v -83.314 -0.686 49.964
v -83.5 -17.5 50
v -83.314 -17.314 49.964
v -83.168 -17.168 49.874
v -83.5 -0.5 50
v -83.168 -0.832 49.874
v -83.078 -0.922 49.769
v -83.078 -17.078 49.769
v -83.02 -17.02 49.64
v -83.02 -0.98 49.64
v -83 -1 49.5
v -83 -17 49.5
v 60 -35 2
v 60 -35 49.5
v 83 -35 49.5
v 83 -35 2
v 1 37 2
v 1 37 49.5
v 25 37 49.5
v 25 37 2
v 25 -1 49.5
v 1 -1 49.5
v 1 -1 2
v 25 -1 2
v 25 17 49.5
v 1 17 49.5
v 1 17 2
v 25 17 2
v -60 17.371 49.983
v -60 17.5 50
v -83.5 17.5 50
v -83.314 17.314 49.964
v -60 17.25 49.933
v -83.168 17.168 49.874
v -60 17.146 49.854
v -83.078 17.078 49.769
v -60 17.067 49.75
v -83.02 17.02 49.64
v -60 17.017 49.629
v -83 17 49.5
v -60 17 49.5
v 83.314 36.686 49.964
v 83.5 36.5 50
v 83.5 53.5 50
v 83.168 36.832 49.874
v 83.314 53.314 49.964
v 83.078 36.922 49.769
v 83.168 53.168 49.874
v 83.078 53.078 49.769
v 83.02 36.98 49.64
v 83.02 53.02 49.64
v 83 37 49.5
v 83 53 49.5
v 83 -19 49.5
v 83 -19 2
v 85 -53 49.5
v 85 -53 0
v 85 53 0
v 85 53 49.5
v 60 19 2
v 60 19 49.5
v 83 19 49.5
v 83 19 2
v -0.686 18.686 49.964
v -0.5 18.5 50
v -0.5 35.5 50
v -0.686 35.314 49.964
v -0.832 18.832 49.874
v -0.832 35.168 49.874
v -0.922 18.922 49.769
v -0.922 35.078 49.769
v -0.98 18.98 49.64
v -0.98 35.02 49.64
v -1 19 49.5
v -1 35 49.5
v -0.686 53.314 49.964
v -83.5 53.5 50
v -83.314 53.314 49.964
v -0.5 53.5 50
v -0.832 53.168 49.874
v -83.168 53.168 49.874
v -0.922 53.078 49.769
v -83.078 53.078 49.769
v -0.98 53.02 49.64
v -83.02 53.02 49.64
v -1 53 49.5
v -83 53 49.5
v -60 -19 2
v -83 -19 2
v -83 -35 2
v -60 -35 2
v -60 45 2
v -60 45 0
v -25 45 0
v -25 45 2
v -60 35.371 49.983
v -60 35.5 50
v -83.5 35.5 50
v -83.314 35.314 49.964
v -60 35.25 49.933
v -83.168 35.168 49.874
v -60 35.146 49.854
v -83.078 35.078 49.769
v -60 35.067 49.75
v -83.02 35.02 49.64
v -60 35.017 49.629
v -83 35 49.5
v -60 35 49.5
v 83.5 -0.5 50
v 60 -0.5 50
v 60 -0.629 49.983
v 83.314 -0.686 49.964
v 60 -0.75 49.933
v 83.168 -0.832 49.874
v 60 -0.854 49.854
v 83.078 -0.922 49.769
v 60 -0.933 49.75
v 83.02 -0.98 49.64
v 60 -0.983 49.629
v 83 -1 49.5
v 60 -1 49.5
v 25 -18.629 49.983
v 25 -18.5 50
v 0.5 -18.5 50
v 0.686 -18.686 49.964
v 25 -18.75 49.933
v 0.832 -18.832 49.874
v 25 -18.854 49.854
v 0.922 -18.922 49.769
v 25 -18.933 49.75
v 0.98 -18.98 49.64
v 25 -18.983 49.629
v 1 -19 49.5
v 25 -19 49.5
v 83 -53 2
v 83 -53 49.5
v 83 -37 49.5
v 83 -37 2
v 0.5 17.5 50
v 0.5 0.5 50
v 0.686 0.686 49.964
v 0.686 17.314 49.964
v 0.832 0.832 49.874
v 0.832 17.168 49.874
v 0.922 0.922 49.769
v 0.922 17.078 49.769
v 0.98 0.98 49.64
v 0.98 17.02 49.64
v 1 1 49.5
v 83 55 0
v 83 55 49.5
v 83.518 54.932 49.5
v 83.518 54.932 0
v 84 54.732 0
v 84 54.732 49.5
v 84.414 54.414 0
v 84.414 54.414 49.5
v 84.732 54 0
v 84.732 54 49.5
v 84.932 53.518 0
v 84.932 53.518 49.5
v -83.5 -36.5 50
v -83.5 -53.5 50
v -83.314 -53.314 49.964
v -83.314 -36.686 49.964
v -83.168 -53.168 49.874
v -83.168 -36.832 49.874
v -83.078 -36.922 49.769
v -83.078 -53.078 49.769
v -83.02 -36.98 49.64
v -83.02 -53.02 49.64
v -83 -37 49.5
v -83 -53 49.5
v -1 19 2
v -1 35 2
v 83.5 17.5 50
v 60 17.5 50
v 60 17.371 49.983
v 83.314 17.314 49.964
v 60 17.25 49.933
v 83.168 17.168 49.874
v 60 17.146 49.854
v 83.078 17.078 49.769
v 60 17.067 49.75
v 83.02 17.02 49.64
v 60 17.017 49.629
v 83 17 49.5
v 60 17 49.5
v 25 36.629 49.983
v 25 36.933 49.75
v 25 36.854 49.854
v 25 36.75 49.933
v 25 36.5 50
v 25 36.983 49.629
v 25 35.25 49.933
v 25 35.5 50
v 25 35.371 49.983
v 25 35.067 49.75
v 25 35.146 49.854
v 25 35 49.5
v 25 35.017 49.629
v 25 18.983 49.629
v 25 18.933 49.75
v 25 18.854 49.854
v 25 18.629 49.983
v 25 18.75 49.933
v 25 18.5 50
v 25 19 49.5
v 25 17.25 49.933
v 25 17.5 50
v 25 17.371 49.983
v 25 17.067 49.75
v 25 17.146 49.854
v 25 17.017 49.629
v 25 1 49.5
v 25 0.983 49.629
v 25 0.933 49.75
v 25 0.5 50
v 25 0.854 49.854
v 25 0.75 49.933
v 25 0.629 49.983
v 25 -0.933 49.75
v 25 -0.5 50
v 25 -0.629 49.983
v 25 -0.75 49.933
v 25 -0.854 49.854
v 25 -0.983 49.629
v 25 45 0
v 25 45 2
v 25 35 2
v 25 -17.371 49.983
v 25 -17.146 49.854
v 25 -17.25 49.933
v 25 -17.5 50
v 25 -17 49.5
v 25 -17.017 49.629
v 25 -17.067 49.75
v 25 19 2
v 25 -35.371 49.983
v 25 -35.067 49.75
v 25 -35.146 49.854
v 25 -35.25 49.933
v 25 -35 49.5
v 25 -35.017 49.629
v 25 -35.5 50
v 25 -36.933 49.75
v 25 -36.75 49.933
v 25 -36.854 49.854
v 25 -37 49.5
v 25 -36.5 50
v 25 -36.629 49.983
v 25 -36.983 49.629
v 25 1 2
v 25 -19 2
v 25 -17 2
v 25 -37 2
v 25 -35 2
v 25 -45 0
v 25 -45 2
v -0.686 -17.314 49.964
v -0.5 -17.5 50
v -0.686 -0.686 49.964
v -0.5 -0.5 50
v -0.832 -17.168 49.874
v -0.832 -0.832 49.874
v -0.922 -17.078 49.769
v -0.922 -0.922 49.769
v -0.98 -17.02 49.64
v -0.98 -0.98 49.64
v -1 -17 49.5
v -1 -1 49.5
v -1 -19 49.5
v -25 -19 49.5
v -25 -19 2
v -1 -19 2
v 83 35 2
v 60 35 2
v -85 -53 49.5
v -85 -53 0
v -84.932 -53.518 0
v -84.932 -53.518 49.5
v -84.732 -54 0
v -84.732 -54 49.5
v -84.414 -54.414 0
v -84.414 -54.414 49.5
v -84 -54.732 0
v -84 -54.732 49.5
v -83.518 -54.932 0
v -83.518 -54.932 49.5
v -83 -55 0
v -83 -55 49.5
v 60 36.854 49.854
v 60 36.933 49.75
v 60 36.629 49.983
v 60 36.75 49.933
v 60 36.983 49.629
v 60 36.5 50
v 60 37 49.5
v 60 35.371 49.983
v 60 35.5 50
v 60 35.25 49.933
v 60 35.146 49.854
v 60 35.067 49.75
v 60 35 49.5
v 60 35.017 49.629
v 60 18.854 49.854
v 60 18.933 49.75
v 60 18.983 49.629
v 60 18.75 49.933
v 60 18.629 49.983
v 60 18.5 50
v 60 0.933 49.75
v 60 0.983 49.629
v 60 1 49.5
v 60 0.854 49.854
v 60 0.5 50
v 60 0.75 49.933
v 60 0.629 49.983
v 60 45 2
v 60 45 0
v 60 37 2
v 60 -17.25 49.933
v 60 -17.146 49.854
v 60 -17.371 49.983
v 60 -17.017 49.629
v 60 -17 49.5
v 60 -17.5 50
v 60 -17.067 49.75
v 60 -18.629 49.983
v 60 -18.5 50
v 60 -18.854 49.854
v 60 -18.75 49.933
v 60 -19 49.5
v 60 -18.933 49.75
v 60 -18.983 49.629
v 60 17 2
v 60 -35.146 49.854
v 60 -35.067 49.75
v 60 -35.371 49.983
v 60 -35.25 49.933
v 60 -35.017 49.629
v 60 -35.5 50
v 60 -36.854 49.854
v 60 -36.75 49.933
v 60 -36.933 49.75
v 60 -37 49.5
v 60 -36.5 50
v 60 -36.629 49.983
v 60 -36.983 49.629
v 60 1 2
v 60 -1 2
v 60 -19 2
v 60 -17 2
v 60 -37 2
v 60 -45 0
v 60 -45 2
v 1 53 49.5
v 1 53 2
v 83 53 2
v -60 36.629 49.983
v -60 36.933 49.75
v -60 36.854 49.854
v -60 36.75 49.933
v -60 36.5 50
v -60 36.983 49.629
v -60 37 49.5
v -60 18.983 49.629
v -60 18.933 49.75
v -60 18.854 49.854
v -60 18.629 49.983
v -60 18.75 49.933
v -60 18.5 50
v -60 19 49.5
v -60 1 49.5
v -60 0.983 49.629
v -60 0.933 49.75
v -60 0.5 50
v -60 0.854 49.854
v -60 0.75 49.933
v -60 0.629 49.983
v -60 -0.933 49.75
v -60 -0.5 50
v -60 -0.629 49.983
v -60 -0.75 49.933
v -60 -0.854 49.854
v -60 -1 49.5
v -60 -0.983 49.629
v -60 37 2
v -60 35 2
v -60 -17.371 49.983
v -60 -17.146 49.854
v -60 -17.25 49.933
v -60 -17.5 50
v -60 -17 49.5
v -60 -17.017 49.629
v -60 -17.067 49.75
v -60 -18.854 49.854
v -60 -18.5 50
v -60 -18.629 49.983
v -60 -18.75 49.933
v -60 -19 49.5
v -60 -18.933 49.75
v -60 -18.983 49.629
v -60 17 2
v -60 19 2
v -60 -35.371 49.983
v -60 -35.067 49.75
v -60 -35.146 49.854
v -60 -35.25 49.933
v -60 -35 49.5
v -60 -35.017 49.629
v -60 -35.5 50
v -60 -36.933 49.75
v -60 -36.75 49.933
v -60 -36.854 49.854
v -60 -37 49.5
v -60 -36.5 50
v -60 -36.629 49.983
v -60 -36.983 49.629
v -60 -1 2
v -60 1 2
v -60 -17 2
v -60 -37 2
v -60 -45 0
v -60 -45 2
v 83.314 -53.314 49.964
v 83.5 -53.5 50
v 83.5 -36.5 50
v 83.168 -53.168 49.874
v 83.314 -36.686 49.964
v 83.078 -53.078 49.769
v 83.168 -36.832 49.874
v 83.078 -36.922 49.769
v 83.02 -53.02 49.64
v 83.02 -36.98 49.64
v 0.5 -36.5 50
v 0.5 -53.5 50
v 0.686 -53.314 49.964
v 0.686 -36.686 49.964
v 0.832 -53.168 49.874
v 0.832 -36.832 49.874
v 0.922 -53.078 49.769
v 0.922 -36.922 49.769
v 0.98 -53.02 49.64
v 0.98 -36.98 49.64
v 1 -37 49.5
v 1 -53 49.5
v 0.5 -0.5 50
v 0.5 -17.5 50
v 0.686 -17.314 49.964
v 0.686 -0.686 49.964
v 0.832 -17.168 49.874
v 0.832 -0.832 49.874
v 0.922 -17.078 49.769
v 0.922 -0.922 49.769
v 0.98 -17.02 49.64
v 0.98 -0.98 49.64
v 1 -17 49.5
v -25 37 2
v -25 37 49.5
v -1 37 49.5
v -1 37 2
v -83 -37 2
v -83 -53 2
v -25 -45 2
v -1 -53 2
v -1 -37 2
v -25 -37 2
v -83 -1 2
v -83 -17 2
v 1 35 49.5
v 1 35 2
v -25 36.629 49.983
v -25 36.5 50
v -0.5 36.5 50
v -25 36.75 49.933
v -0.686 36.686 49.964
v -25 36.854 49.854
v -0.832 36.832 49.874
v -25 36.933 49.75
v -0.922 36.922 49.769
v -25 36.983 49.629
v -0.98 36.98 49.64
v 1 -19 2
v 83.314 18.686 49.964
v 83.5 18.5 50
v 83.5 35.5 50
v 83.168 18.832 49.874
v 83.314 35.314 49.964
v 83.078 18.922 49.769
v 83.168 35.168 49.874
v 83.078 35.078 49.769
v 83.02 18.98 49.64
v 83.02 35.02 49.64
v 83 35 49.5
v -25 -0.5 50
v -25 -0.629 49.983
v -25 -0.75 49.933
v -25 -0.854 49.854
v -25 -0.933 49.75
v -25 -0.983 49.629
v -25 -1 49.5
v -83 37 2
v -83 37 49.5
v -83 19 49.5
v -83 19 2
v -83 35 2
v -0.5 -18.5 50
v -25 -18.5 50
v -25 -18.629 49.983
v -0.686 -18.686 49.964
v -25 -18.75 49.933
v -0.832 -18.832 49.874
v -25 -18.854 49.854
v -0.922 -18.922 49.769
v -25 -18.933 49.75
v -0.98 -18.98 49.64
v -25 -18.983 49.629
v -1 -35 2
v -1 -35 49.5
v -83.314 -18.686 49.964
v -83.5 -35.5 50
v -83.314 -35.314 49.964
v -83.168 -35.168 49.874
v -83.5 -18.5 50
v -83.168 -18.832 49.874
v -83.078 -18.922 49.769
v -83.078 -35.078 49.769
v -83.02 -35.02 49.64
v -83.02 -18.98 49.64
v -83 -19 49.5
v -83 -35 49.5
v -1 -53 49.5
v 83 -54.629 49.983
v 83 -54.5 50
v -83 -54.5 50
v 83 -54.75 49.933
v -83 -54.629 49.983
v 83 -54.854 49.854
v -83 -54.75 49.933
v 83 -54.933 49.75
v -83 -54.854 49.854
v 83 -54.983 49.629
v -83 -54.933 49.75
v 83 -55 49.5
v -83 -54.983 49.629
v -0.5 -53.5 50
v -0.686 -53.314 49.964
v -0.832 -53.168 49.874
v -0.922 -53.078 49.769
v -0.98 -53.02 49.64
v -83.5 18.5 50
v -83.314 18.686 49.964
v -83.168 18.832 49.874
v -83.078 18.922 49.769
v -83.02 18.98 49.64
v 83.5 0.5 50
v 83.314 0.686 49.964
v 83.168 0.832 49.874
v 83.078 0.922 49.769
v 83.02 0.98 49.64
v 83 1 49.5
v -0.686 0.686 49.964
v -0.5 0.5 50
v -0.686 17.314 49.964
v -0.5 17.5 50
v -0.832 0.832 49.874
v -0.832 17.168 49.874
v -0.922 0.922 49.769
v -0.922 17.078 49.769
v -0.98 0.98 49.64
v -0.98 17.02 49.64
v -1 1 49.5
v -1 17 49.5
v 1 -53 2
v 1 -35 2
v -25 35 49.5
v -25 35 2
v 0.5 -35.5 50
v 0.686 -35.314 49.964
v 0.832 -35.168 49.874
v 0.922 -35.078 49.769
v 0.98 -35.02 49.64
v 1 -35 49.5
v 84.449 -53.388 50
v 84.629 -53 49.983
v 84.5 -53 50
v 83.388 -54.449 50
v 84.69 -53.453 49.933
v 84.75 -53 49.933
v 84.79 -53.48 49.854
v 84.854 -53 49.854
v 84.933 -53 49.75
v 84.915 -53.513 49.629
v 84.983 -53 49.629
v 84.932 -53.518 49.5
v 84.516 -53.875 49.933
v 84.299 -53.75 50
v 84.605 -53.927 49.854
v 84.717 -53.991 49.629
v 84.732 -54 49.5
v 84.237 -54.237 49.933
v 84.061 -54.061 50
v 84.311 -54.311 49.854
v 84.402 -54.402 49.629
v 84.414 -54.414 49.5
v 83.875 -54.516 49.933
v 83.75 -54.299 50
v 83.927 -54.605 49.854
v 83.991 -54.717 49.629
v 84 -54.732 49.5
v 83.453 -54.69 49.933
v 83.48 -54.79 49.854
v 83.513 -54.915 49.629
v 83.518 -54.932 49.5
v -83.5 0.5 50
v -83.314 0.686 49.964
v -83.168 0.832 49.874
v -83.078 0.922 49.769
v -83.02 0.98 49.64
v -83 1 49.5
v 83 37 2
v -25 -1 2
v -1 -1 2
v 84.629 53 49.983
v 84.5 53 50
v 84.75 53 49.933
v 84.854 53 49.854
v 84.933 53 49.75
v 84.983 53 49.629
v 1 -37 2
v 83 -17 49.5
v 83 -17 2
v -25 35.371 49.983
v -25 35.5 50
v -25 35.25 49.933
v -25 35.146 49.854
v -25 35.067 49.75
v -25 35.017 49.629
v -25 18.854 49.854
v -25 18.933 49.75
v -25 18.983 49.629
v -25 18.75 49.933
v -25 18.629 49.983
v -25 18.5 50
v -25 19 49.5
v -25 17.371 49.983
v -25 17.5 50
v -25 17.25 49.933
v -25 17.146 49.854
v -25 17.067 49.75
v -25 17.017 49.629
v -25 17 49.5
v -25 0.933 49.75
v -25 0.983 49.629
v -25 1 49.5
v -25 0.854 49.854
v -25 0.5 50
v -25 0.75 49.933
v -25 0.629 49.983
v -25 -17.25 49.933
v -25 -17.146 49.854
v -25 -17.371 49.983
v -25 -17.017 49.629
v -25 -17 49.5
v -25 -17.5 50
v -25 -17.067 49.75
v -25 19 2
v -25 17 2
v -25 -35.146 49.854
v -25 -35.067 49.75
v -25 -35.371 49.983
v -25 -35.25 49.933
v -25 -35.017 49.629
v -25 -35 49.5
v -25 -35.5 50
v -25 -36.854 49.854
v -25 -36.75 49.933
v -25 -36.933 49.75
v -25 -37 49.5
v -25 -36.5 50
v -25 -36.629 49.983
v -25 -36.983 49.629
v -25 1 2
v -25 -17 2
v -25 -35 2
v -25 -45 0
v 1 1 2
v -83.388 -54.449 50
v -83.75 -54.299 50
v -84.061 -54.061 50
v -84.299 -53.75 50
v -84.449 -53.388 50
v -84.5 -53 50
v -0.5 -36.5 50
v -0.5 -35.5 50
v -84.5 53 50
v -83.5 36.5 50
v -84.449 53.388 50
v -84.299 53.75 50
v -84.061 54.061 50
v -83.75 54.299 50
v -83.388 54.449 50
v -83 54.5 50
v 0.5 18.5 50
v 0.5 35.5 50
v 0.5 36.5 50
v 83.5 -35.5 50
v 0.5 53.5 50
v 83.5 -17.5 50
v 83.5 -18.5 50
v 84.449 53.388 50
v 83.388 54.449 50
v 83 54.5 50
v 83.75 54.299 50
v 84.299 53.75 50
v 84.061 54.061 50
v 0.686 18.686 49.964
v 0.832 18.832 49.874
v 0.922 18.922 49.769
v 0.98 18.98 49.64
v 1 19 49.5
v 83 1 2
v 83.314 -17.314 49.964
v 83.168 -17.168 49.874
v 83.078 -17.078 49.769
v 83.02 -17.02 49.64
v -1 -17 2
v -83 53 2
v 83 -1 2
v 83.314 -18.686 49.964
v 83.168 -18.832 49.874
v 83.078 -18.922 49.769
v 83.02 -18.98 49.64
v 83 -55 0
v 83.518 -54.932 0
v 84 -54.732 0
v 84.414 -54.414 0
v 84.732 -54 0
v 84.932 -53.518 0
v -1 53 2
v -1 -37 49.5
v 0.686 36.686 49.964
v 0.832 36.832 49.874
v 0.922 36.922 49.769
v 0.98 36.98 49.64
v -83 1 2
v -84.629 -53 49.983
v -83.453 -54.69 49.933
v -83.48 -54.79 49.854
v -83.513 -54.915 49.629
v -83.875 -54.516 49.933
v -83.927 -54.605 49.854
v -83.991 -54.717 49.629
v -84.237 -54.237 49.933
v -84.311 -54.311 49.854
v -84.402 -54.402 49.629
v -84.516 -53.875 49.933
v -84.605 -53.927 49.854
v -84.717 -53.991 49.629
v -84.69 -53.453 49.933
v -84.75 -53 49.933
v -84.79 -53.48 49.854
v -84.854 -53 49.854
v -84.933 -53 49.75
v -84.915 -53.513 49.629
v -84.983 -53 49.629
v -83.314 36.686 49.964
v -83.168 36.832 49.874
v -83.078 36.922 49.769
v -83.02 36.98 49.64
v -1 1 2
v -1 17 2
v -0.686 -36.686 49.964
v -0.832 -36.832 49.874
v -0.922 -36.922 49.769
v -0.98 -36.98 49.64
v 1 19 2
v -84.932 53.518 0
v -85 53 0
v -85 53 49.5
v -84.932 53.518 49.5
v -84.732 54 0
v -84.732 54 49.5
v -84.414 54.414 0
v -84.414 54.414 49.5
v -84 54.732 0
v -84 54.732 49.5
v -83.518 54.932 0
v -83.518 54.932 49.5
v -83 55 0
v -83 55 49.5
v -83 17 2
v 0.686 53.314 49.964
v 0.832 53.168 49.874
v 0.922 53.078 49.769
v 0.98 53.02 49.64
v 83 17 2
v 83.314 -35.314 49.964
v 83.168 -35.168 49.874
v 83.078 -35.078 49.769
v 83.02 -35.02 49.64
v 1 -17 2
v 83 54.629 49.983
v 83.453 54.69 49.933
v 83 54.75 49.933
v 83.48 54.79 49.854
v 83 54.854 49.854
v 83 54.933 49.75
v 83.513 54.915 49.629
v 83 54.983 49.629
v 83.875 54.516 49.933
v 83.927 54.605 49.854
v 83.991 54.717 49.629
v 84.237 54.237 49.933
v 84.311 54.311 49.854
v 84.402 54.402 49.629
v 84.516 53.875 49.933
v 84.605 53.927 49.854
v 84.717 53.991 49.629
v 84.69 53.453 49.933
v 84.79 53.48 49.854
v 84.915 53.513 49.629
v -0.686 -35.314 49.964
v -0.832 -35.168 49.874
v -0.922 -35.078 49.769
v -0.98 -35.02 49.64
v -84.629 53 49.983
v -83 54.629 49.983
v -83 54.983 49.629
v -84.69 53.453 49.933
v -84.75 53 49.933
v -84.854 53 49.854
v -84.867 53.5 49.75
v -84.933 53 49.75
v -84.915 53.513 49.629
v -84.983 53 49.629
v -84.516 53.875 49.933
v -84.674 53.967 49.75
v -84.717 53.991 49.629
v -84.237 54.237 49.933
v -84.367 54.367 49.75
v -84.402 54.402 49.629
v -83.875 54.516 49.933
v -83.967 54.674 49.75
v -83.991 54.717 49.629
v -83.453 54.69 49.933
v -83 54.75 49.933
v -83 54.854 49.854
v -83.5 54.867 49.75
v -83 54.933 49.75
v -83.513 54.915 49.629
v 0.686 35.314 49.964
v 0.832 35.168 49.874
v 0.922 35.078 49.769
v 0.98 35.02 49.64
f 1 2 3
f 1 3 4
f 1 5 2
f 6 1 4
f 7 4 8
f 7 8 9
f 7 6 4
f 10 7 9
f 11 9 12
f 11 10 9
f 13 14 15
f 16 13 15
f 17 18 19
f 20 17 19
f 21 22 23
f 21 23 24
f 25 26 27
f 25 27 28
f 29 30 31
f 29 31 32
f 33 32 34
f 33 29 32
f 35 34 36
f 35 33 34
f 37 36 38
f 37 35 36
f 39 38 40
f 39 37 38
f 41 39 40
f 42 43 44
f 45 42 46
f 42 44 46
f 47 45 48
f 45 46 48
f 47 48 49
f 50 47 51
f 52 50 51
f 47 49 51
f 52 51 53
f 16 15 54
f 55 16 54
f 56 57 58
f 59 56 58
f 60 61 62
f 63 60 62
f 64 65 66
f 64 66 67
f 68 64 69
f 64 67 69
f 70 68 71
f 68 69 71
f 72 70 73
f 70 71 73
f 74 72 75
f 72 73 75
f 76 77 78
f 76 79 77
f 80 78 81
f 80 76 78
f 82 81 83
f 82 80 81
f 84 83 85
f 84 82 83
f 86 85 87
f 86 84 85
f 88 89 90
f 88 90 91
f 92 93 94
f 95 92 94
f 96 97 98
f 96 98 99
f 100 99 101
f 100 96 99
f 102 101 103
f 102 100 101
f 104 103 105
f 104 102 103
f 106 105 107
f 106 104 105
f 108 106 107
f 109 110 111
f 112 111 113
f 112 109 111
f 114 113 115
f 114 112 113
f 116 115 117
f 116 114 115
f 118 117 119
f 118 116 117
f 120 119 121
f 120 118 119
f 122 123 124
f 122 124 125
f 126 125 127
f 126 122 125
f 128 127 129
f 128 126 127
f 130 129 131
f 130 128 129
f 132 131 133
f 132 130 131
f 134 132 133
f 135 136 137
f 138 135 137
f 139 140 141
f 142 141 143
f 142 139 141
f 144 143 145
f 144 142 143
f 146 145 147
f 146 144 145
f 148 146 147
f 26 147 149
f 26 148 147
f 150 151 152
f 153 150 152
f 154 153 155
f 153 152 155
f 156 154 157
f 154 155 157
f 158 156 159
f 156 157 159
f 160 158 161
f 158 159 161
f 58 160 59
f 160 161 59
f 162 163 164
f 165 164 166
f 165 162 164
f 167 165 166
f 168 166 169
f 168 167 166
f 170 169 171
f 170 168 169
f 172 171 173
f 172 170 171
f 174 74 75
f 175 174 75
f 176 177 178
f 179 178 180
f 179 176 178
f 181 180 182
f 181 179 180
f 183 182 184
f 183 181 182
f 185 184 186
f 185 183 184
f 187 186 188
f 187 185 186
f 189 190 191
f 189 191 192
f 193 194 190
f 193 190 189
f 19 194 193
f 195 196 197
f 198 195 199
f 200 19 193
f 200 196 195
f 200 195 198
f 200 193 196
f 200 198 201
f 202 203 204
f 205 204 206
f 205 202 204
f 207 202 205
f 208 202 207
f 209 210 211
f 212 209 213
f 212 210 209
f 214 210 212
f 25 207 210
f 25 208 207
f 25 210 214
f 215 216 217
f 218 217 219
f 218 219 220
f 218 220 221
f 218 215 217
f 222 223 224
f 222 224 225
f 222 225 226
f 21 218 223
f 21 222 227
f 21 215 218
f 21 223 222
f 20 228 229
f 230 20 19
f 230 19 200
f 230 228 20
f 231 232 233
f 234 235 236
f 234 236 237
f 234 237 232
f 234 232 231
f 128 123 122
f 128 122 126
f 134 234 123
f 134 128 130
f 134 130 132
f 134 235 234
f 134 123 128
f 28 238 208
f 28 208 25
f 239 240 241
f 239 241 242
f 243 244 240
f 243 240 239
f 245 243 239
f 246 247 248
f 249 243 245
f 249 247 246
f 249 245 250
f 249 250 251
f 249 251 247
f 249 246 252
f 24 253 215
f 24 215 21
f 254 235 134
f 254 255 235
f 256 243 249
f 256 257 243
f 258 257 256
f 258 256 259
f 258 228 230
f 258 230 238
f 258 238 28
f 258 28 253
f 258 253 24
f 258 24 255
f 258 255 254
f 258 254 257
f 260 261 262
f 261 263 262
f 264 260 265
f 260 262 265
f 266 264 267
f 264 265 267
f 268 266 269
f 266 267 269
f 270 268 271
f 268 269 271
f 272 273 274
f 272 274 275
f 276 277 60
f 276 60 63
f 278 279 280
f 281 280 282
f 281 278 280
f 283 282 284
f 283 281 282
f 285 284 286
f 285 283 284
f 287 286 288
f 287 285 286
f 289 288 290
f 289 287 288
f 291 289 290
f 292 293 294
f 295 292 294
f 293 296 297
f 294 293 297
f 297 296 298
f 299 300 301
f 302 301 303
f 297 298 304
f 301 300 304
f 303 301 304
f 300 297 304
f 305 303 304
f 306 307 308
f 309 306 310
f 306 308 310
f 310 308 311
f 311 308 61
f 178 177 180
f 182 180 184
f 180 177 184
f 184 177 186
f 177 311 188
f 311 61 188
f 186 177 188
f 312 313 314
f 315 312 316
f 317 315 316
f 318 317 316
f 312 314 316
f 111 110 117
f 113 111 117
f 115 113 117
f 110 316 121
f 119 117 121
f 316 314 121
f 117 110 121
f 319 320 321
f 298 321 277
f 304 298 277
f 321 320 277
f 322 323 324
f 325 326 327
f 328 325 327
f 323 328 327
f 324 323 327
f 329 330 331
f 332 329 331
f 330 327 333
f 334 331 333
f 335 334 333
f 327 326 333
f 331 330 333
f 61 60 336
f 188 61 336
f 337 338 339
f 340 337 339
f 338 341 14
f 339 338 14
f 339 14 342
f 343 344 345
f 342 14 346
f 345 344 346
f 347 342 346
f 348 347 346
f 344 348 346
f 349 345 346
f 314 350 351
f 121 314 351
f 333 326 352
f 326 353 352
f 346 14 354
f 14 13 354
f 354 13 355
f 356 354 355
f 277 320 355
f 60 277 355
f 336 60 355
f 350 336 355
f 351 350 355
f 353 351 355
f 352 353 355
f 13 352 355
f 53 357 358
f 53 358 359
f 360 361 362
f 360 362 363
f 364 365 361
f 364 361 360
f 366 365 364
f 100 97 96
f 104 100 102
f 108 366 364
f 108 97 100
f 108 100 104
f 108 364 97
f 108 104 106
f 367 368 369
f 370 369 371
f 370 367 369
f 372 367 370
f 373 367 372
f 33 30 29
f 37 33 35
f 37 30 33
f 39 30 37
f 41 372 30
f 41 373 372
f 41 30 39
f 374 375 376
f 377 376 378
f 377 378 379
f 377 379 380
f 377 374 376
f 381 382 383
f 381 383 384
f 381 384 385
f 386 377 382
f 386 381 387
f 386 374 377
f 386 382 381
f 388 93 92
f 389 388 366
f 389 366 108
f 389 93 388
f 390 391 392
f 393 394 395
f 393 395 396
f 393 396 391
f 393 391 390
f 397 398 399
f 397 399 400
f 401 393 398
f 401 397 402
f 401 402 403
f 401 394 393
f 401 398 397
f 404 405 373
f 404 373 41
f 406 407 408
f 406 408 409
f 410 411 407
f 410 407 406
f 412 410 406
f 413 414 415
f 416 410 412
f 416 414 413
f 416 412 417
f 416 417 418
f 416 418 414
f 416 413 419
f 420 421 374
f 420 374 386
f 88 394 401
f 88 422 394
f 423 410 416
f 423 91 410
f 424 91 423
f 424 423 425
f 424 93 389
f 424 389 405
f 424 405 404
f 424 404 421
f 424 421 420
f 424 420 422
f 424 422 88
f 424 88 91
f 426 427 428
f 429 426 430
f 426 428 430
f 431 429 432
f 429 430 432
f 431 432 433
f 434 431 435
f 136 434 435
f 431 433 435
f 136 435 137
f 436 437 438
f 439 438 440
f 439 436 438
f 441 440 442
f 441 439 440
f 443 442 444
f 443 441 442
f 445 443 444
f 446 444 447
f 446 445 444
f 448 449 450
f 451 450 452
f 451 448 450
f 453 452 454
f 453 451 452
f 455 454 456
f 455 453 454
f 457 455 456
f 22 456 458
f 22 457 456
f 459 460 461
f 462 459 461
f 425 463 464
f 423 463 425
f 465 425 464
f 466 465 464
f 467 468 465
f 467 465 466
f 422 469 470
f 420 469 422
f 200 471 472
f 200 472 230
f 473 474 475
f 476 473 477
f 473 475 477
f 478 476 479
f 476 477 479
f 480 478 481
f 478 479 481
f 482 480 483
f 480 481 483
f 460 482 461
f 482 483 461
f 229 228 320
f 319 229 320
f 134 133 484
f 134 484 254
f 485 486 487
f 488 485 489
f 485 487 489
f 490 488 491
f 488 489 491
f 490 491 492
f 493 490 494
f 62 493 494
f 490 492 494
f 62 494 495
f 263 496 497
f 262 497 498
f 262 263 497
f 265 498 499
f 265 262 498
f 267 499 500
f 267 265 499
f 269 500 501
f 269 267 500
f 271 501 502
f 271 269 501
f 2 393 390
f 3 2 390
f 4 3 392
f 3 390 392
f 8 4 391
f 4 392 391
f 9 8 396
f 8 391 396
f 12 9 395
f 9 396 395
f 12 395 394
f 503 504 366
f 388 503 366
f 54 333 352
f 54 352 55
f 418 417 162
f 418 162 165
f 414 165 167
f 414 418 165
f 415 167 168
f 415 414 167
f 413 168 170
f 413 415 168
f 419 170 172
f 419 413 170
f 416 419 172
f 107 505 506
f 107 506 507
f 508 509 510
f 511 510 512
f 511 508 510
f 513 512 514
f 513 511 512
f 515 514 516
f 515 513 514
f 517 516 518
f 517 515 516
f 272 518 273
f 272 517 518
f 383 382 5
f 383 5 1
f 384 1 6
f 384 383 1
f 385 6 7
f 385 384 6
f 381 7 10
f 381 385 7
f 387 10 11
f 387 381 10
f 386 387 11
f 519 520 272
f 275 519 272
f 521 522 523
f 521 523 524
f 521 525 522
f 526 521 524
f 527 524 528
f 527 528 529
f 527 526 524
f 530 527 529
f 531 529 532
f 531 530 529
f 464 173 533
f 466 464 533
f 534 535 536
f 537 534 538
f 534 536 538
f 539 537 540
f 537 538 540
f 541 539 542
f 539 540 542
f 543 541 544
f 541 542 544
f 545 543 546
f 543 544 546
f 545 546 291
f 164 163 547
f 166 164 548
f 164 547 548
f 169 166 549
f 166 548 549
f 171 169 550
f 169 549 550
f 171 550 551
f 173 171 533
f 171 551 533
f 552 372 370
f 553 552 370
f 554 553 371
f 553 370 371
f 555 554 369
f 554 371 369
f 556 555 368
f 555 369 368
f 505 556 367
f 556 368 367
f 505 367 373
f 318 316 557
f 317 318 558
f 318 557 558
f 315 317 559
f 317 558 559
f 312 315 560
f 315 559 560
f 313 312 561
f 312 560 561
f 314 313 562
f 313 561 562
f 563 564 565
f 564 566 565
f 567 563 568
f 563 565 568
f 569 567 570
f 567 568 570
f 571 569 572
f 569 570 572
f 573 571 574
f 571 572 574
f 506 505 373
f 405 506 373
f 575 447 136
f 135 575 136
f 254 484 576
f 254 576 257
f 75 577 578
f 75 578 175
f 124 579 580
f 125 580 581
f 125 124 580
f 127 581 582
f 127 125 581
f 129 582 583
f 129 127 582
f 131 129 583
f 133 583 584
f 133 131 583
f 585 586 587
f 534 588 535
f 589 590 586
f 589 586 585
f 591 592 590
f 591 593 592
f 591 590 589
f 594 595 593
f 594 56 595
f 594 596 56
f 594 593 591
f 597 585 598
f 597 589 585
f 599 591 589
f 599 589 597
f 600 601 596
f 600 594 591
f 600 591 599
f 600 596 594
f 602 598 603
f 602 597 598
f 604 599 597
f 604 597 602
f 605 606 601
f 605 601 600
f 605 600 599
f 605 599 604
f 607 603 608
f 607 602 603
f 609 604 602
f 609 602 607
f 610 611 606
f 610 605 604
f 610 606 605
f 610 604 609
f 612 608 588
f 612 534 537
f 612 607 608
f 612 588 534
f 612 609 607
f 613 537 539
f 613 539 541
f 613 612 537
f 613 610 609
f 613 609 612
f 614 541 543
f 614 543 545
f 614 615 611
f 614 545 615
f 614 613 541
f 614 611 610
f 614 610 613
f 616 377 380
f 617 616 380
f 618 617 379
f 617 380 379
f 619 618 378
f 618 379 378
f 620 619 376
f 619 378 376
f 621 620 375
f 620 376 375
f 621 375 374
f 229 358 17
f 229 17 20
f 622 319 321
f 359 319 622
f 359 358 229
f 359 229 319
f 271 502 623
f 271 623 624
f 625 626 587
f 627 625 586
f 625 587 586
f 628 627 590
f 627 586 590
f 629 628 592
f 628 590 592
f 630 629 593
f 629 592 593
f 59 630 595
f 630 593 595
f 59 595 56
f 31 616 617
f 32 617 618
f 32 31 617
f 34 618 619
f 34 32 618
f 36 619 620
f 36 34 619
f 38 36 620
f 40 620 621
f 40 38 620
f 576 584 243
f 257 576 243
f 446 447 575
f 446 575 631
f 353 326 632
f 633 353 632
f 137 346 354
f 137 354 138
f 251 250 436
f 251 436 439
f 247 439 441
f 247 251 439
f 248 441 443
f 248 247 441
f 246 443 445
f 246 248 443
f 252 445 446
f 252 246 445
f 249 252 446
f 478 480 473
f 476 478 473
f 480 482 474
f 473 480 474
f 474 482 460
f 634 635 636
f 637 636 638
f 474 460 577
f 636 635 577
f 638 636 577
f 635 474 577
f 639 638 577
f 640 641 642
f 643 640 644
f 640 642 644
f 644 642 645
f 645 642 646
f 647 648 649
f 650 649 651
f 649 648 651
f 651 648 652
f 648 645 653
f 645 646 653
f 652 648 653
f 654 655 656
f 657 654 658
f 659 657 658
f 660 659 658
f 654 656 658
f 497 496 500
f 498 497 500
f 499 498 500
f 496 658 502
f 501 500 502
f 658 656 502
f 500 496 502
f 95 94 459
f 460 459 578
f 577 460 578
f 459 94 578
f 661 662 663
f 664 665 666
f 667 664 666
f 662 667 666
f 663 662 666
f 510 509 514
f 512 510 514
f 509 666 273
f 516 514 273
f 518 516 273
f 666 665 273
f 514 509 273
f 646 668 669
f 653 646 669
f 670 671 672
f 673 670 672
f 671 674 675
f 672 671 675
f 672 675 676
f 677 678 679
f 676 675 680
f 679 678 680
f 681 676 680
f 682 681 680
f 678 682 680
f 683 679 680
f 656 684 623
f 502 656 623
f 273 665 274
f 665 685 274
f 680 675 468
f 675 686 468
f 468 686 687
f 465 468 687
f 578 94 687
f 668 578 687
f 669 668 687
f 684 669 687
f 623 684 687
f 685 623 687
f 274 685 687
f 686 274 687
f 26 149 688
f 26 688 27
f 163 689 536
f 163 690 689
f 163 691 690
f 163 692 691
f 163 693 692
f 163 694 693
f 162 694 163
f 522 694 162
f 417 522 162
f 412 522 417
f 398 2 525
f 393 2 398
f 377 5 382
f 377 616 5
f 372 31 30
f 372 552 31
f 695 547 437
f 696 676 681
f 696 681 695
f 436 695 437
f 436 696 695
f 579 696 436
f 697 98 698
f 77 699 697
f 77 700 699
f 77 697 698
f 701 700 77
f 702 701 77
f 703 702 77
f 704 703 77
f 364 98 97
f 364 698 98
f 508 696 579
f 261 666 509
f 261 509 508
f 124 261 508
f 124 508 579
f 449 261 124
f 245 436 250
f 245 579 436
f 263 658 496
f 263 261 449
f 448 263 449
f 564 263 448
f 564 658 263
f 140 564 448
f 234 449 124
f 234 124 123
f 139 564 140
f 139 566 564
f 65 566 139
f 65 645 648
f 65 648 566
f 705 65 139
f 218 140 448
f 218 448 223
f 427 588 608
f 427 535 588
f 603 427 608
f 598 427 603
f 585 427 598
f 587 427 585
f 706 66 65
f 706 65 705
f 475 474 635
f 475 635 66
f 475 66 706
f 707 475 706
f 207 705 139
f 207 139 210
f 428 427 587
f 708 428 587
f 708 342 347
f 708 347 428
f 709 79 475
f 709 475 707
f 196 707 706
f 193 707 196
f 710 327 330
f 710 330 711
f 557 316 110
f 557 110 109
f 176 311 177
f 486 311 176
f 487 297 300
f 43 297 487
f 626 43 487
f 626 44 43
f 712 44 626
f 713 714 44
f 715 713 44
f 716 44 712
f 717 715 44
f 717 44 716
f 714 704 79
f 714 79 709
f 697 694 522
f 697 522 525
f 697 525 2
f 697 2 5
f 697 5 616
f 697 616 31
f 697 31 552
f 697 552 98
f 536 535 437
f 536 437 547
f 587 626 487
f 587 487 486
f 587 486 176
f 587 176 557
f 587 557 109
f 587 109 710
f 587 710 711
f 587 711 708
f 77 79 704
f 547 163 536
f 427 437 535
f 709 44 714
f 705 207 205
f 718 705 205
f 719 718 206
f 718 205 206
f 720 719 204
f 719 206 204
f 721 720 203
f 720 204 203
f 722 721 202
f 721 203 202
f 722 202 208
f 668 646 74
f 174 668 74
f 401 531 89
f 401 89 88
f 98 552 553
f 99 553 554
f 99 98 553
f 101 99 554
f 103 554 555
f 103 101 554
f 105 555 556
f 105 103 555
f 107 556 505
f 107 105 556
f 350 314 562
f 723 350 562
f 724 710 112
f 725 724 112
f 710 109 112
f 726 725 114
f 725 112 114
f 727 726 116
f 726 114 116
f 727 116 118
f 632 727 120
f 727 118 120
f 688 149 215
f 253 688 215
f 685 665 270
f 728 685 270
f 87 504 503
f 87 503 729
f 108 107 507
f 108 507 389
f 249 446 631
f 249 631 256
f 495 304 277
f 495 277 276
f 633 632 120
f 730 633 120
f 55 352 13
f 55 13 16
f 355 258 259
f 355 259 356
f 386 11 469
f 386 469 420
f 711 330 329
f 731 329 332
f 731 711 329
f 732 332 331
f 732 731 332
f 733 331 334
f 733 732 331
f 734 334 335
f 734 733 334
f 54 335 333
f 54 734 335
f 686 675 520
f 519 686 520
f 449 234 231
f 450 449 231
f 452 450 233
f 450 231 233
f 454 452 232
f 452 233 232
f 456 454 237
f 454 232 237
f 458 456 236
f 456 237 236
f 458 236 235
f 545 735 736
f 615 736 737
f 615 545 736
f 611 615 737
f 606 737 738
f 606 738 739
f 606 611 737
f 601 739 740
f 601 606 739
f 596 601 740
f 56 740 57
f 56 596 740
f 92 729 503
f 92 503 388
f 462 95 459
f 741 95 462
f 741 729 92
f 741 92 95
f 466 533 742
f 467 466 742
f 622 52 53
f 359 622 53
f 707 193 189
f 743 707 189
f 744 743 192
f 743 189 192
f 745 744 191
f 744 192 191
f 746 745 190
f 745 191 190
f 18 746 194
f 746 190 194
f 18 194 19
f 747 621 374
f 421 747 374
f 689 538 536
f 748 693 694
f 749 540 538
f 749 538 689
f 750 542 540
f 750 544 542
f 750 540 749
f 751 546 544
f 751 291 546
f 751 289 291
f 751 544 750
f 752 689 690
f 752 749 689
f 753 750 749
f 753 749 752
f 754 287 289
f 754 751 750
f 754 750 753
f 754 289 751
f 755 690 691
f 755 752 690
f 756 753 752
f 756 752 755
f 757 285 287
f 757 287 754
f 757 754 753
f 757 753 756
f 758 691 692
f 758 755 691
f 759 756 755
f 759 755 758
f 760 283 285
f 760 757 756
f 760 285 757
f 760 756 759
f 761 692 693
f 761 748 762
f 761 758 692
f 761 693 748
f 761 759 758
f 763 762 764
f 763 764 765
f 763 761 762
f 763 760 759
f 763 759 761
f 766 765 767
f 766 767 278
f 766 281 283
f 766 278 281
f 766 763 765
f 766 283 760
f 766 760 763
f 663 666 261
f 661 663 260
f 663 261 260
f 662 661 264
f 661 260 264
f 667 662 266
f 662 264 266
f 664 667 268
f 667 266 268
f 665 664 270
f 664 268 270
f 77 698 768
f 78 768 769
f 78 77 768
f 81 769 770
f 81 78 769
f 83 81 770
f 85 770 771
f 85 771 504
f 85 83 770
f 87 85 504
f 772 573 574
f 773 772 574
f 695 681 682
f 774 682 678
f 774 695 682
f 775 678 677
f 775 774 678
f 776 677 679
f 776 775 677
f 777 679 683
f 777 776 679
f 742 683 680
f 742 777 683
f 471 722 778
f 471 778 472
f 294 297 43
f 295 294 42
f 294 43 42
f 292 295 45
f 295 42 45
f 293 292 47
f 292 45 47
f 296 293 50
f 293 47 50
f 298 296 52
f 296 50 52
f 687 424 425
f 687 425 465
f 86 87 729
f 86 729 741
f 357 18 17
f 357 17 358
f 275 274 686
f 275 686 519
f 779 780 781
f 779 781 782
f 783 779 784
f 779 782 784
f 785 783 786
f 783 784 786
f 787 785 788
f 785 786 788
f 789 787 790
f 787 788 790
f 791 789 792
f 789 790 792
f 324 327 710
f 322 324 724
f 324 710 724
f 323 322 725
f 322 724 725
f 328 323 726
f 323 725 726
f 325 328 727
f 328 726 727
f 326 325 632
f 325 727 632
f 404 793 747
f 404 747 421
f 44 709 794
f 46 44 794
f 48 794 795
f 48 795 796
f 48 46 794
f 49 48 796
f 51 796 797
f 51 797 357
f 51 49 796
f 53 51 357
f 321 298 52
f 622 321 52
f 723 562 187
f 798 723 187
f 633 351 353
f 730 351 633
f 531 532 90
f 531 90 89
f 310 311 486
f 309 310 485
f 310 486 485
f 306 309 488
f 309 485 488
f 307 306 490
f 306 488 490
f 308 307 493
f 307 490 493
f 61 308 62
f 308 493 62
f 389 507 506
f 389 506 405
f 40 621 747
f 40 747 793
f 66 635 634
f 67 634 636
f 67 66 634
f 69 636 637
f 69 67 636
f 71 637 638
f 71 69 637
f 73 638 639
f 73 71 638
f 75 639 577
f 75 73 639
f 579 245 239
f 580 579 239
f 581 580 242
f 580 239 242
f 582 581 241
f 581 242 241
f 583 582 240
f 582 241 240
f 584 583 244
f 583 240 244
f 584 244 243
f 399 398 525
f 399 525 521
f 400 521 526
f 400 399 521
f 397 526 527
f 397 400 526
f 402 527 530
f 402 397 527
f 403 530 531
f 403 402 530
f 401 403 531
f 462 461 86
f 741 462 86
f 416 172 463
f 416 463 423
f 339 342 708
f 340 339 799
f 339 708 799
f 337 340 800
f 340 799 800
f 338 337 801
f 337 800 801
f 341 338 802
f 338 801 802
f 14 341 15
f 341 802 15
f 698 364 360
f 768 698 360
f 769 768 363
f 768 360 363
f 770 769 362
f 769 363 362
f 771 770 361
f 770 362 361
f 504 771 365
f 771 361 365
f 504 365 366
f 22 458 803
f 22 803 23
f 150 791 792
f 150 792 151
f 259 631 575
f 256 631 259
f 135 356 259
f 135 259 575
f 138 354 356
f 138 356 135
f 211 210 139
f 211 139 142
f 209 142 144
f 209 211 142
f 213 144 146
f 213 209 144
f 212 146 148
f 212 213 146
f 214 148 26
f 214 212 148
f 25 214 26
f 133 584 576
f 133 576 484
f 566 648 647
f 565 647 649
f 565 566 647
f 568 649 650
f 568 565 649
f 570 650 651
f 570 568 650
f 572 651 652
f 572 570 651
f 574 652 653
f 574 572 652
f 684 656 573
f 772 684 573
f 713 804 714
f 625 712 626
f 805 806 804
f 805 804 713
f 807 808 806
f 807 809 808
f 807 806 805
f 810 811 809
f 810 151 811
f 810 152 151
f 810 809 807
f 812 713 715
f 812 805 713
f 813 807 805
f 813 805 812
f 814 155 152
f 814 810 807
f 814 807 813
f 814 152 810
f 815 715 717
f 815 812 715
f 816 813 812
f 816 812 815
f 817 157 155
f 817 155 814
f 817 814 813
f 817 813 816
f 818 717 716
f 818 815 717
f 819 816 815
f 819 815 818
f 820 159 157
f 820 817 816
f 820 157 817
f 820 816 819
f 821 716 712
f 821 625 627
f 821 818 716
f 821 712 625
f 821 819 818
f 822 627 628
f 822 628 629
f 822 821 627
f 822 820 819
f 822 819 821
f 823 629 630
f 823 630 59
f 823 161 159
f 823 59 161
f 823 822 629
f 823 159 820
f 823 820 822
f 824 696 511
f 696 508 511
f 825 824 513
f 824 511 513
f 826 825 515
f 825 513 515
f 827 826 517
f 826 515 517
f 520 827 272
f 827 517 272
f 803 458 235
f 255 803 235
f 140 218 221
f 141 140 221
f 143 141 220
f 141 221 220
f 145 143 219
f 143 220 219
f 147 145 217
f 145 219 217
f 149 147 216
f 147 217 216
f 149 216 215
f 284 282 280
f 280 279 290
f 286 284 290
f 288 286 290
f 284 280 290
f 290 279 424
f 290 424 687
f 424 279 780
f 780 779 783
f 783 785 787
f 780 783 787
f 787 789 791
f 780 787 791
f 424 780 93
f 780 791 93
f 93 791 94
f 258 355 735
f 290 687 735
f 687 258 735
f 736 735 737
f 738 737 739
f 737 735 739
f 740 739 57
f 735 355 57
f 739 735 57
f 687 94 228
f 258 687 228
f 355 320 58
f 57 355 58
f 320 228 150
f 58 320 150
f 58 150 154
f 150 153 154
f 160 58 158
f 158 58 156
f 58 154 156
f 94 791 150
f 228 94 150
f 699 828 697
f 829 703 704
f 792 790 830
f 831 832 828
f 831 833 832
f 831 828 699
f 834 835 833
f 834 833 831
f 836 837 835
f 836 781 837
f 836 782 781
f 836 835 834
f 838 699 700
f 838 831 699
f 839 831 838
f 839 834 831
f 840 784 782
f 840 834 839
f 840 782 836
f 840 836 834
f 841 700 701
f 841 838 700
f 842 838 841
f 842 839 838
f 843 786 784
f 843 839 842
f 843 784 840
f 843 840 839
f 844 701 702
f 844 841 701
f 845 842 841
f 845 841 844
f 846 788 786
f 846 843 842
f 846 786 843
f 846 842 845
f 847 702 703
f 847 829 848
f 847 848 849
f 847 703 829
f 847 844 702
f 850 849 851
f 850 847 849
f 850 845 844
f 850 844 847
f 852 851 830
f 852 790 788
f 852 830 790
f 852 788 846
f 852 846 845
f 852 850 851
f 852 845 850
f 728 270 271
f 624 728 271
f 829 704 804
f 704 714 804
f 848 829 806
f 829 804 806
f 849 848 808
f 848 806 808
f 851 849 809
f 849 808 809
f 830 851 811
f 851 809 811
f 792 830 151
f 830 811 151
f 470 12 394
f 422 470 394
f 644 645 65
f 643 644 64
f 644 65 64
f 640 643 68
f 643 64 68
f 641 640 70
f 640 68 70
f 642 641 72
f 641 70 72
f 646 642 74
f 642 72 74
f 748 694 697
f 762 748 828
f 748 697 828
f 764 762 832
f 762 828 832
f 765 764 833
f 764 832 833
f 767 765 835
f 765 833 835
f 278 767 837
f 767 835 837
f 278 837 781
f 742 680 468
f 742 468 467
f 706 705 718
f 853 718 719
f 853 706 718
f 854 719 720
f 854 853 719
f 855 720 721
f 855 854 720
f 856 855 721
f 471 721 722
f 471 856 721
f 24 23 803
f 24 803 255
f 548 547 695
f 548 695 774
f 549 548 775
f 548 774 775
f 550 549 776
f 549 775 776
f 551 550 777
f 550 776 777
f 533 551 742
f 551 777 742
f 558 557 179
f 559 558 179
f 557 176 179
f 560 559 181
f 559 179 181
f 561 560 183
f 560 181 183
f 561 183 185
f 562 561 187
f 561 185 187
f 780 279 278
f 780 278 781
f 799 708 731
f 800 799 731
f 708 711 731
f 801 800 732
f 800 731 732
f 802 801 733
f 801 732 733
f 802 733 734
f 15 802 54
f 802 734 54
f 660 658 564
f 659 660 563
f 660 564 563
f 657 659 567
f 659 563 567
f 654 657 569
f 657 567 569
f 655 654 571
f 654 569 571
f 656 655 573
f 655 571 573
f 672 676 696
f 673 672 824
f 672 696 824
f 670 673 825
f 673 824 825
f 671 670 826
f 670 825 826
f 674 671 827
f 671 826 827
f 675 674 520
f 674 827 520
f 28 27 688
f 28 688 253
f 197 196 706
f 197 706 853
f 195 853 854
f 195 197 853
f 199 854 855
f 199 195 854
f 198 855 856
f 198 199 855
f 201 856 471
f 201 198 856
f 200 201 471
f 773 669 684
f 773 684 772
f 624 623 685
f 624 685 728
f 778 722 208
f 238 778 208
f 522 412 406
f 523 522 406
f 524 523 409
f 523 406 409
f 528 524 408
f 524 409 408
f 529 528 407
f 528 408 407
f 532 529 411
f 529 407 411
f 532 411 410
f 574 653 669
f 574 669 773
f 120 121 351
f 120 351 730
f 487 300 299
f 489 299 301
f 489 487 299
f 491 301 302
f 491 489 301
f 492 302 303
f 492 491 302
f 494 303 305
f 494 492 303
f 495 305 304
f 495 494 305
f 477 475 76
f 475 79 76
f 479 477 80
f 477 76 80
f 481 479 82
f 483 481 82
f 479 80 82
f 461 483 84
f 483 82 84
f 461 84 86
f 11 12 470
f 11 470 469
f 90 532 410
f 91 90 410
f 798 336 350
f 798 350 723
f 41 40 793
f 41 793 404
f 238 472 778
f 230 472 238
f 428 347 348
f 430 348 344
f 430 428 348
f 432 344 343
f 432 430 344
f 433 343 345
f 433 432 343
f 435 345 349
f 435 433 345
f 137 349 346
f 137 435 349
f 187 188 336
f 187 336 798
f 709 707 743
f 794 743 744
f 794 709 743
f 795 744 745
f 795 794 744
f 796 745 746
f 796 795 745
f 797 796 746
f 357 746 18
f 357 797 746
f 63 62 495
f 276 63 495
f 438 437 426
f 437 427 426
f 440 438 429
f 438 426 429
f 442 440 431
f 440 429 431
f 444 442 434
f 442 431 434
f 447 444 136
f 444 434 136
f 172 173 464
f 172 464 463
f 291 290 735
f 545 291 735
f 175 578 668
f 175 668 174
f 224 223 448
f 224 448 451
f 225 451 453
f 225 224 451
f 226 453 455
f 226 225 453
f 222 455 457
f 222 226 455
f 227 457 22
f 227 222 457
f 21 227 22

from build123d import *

# Parameters (mm, degrees)
SKETCH001_W     = 170
SKETCH001_H     = 110
PAD_DEPTH       = 50
SKETCH_W        = 82
SKETCH_H        = 16
POCKET_DEPTH    = 48
FILLET_R        = 2
FILLET001_R     = 0.5
SKETCH002_W     = 35
SKETCH002_H     = 90
POCKET001_DEPTH = 50.001


with BuildPart() as part:
    # Sketch001 → Pad (new body)
    with BuildSketch(Plane.XY):
        Rectangle(SKETCH001_W, SKETCH001_H)
    extrude(amount=PAD_DEPTH)

    # Sketch (on Face6 of Pad) → Pocket (cut)
    with BuildSketch(Plane.XY.offset(50)):
        with Locations((-42, 45)):
            Rectangle(SKETCH_W, SKETCH_H)
        with Locations((-42, 27)):
            Rectangle(SKETCH_W, SKETCH_H)
        with Locations((-42, 9)):
            Rectangle(SKETCH_W, SKETCH_H)
        with Locations((42, 45)):
            Rectangle(SKETCH_W, SKETCH_H)
        with Locations((42, 27)):
            Rectangle(SKETCH_W, SKETCH_H)
        with Locations((42, 9)):
            Rectangle(SKETCH_W, SKETCH_H)
        with Locations((-42, -9)):
            Rectangle(SKETCH_W, SKETCH_H)
        with Locations((-42, -27)):
            Rectangle(SKETCH_W, SKETCH_H)
        with Locations((-42, -45)):
            Rectangle(SKETCH_W, SKETCH_H)
        with Locations((42, -9)):
            Rectangle(SKETCH_W, SKETCH_H)
        with Locations((42, -27)):
            Rectangle(SKETCH_W, SKETCH_H)
        with Locations((42, -45)):
            Rectangle(SKETCH_W, SKETCH_H)
    extrude(amount=-POCKET_DEPTH, mode=Mode.SUBTRACT)

    # Fillet
    fillet_edges = [part.edges().sort_by_distance(p)[0] for p in [
        (85, 55, 25),
        (85, -55, 25),
        (-85, -55, 25),
        (-85, 55, 25),
    ]]
    fillet(fillet_edges, radius=FILLET_R)

    # Fillet001
    fillet001_edges = [part.edges().sort_by_distance(p)[0] for p in [
        (0, 55, 50),
        (84.414214, 54.414214, 50),
        (-84.414214, 54.414214, 50),
        (85, 0, 50),
        (-85, 0, 50),
        (84.414214, -54.414214, 50),
        (-84.414214, -54.414214, 50),
        (0, -55, 50),
        (-42, -37, 50),
        (-1, -45, 50),
        (-83, -45, 50),
        (-42, -53, 50),
        (-42, -19, 50),
        (-1, -27, 50),
        (-83, -27, 50),
        (-42, -35, 50),
        (-42, -1, 50),
        (-1, -9, 50),
        (-83, -9, 50),
        (-42, -17, 50),
        (1, -45, 50),
        (42, -53, 50),
        (42, -37, 50),
        (83, -45, 50),
        (1, -27, 50),
        (42, -35, 50),
        (42, -19, 50),
        (83, -27, 50),
        (1, -9, 50),
        (42, -17, 50),
        (42, -1, 50),
        (83, -9, 50),
        (-83, 9, 50),
        (-42, 1, 50),
        (-42, 17, 50),
        (-1, 9, 50),
        (-42, 35, 50),
        (-1, 27, 50),
        (-83, 27, 50),
        (-42, 19, 50),
        (-83, 45, 50),
        (-42, 37, 50),
        (-1, 45, 50),
        (-42, 53, 50),
        (1, 9, 50),
        (42, 1, 50),
        (42, 17, 50),
        (83, 9, 50),
        (1, 27, 50),
        (42, 19, 50),
        (42, 35, 50),
        (83, 27, 50),
        (1, 45, 50),
        (42, 37, 50),
        (42, 53, 50),
        (83, 45, 50),
    ]]
    fillet(fillet001_edges, radius=FILLET001_R)

    # Sketch002 (on Face4 of Fillet001) → Pocket001 (cut, through all)
    with BuildSketch(Plane(origin=(0, 0, 0), x_dir=(1, 0, 0), z_dir=(0, 0, -1))):
        with Locations((-42.5, 0)):
            Rectangle(SKETCH002_W, SKETCH002_H)
        with Locations((42.5, 0)):
            Rectangle(SKETCH002_W, SKETCH002_H)
    extrude(amount=-POCKET001_DEPTH, mode=Mode.SUBTRACT)


solid = part.part
